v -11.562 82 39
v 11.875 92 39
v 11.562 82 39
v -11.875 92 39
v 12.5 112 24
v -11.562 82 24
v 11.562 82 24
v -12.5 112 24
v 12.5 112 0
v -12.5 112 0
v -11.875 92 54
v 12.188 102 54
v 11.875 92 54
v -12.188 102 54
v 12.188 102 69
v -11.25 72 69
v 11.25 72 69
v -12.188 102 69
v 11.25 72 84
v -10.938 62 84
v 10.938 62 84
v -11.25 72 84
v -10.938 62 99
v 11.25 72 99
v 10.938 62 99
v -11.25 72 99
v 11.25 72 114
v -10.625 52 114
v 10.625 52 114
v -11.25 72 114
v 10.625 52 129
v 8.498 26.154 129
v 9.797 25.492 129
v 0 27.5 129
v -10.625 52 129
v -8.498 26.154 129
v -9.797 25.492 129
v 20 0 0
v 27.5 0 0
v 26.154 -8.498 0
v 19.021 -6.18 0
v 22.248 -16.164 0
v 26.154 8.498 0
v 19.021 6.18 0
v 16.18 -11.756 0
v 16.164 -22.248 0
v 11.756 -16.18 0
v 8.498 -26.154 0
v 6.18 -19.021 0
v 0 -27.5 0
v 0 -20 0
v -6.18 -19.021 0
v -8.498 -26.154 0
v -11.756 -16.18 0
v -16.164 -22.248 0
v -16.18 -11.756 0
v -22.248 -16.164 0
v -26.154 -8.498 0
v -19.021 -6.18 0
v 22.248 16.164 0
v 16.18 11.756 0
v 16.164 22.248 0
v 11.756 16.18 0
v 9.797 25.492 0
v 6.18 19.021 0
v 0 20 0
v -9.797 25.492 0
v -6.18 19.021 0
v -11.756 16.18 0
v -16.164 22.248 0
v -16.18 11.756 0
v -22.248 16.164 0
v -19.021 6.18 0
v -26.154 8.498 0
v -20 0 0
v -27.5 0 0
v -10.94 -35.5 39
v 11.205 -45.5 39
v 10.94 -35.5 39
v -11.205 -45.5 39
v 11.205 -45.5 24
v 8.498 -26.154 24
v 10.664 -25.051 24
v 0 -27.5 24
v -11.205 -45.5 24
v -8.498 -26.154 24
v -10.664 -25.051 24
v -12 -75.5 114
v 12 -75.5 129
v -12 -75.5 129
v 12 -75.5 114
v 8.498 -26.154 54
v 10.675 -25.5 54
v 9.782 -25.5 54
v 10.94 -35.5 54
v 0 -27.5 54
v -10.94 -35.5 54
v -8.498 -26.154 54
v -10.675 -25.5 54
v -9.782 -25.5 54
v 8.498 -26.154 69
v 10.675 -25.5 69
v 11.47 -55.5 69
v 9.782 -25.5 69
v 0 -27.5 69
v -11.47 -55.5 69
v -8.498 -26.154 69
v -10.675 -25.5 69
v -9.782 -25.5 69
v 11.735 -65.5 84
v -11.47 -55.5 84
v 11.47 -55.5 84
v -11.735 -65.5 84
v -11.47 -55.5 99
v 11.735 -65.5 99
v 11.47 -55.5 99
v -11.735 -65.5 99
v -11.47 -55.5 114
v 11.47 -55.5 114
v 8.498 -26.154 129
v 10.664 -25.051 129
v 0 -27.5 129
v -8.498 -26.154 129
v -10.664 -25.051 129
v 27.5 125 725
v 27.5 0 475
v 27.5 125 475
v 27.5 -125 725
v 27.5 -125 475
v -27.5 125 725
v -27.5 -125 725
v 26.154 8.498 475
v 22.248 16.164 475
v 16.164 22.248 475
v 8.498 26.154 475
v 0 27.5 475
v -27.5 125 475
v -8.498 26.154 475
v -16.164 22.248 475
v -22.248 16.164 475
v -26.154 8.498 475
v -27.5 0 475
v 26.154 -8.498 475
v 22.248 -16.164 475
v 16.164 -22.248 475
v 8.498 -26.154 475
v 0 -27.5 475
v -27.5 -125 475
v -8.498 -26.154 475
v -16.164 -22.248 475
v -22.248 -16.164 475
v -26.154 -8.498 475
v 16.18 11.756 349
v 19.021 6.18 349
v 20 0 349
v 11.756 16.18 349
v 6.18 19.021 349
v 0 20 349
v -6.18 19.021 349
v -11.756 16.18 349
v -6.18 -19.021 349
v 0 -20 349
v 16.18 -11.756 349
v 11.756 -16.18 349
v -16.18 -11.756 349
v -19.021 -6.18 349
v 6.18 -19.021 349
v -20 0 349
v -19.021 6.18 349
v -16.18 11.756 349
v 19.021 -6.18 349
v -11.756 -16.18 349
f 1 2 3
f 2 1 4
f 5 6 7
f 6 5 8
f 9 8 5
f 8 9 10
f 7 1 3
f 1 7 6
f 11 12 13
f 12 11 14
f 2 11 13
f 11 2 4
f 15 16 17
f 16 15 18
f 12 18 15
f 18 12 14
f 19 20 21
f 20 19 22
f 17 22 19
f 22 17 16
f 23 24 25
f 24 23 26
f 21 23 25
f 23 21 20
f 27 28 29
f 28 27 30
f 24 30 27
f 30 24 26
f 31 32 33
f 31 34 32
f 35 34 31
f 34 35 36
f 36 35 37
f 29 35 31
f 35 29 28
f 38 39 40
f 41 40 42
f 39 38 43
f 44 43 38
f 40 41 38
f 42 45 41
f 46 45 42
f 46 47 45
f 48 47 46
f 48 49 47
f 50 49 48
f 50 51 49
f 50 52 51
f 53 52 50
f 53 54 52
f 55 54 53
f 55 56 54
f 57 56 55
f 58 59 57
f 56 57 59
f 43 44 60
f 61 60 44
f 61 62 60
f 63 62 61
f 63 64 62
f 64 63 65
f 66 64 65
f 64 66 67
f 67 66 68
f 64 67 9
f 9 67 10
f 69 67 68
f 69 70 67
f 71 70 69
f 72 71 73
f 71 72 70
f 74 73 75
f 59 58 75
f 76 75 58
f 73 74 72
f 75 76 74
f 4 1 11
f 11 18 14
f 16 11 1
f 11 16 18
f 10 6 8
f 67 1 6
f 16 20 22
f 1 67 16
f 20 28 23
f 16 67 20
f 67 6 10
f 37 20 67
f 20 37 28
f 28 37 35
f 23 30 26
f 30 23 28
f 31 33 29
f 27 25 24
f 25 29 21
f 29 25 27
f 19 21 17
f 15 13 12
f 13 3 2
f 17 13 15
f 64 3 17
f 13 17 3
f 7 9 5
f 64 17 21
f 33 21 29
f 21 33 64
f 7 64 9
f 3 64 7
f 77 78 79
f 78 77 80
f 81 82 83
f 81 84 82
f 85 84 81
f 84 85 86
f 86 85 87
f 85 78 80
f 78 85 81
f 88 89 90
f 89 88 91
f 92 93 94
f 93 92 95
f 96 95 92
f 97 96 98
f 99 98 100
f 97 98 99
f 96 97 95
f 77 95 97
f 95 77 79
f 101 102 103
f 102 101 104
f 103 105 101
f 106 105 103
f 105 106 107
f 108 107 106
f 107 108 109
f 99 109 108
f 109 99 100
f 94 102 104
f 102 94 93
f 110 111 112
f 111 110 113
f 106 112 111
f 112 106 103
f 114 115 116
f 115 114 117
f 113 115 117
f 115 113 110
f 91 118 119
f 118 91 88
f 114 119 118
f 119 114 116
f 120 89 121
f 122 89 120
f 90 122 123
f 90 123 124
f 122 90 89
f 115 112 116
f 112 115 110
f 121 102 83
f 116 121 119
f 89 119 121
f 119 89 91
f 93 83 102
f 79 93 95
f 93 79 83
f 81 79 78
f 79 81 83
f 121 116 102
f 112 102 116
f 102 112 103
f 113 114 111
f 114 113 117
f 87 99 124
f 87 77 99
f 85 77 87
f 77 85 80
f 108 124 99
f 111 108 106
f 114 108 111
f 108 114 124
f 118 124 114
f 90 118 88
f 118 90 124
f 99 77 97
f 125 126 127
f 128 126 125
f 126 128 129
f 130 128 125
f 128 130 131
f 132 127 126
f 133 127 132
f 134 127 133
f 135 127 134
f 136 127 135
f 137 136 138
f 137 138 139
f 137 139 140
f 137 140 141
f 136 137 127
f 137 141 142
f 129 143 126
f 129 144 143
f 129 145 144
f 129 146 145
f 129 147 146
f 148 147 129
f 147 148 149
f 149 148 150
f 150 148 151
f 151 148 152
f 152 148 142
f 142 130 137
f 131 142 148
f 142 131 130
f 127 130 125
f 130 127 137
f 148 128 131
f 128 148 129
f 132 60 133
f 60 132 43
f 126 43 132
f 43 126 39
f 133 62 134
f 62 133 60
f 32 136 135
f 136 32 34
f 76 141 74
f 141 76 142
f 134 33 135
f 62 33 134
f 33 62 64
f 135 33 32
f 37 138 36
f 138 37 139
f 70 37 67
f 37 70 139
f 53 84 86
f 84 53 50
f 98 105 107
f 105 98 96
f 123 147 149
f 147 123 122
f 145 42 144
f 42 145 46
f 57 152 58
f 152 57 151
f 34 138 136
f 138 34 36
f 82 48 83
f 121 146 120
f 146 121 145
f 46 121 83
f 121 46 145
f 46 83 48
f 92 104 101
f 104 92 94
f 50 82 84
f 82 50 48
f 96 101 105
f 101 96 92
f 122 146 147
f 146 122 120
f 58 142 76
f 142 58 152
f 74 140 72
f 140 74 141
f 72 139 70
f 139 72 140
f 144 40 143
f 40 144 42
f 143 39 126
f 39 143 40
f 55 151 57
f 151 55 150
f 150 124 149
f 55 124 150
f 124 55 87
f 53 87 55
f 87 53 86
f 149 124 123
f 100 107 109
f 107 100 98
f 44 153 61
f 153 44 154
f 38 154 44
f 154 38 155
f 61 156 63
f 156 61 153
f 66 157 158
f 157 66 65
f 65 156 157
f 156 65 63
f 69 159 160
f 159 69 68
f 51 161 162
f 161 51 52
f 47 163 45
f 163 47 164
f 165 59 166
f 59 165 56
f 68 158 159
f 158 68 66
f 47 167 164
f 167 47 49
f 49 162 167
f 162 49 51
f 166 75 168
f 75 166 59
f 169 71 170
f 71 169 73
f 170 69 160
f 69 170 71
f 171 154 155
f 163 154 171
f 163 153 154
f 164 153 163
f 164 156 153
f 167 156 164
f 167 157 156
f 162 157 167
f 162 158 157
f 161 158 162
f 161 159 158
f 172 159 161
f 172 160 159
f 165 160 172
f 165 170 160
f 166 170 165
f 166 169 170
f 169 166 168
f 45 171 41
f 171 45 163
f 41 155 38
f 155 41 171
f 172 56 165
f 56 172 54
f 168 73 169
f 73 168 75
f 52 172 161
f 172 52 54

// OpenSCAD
//Seite mit Hebel
a=12.5;		// 25/2 in x außen
b=9;		// 18/2 in x innen
c=129;		// 129 in z
d=112;		// 112 in y

//Seite ohne Hebel
e=12;		// 24/2 in x außen
f=10;		// 20/2 in x innen
g=c;		// c in z
h=-75.5;	// -75.5 in y

//Feinheit der Zylinder
feinheit=20;

//Tiefe - Put ur own magic values here
sb = [3,2,1,4,5,4,6];

//Stützen zum Druck
s=false;

difference(){
	union(){
		translate([0,0,600]) scale([55,250,250]) cube(1, center=true); // Griff
		cylinder(h=500, r=55/2, $fn=feinheit); // Zentralzylinder
		difference(){ // Schließbart
			polyhedron(
				points=[
					[b,0,0],[-b,0,0],[a,d,0],[-a,d,0],
					[b,0,c],[-b,0,c],[a,d,c],[-a,d,c]
				],
				faces=[
					[0,1,3],[0,3,2],[5,3,1],[5,7,3],
					[3,7,2],[7,6,2],[4,7,5],[4,6,7],
					[4,5,0],[5,1,0],[6,4,0],[6,0,2]
				]
			);
			for (i=[0:6]){
				translate([-15,d-sb[i]*10,15*(i)+24])
				scale([30,sb[i]*10,15])
				cube(1);
			}
		}
		difference(){ // Gegenbart
			polyhedron(
				points=[
					[f,0,0],[-f,0,0],[e,h,0],[-e,h,0],
					[f,0,g],[-f,0,g],[e,h,g],[-e,h,g]
				],
				faces=[
					[0,1,3],[0,3,2],[5,3,1],[5,7,3],
					[3,7,2],[7,6,2],[4,7,5],[4,6,7],
					[4,5,0],[5,1,0],[6,4,0],[6,0,2]
				]
			);
			translate([-15,0,0]) scale([30,h,24]) cube(1);
			for (i=[0:6]){
				translate([-15,h,15*(i)+24])
				scale([30,(6-sb[i])*10,15])
				cube(1);
			}
		}
		stuetze();
	}
	translate([0,0,-1]){
		cylinder(h=350, r=40/2, $fn=feinheit); // Negativzylinder
	}
}

module stuetze(){
	if (s==true){
		for(i=[2:5]){
			translate([-8,-15*i+4,0]) scale([-20,2,c]) cube(1);
		}
		for(i=[2:7]){
			translate([-8,15*i+2,0]) scale([-20,2,c]) cube(1);
		}
	}
}
